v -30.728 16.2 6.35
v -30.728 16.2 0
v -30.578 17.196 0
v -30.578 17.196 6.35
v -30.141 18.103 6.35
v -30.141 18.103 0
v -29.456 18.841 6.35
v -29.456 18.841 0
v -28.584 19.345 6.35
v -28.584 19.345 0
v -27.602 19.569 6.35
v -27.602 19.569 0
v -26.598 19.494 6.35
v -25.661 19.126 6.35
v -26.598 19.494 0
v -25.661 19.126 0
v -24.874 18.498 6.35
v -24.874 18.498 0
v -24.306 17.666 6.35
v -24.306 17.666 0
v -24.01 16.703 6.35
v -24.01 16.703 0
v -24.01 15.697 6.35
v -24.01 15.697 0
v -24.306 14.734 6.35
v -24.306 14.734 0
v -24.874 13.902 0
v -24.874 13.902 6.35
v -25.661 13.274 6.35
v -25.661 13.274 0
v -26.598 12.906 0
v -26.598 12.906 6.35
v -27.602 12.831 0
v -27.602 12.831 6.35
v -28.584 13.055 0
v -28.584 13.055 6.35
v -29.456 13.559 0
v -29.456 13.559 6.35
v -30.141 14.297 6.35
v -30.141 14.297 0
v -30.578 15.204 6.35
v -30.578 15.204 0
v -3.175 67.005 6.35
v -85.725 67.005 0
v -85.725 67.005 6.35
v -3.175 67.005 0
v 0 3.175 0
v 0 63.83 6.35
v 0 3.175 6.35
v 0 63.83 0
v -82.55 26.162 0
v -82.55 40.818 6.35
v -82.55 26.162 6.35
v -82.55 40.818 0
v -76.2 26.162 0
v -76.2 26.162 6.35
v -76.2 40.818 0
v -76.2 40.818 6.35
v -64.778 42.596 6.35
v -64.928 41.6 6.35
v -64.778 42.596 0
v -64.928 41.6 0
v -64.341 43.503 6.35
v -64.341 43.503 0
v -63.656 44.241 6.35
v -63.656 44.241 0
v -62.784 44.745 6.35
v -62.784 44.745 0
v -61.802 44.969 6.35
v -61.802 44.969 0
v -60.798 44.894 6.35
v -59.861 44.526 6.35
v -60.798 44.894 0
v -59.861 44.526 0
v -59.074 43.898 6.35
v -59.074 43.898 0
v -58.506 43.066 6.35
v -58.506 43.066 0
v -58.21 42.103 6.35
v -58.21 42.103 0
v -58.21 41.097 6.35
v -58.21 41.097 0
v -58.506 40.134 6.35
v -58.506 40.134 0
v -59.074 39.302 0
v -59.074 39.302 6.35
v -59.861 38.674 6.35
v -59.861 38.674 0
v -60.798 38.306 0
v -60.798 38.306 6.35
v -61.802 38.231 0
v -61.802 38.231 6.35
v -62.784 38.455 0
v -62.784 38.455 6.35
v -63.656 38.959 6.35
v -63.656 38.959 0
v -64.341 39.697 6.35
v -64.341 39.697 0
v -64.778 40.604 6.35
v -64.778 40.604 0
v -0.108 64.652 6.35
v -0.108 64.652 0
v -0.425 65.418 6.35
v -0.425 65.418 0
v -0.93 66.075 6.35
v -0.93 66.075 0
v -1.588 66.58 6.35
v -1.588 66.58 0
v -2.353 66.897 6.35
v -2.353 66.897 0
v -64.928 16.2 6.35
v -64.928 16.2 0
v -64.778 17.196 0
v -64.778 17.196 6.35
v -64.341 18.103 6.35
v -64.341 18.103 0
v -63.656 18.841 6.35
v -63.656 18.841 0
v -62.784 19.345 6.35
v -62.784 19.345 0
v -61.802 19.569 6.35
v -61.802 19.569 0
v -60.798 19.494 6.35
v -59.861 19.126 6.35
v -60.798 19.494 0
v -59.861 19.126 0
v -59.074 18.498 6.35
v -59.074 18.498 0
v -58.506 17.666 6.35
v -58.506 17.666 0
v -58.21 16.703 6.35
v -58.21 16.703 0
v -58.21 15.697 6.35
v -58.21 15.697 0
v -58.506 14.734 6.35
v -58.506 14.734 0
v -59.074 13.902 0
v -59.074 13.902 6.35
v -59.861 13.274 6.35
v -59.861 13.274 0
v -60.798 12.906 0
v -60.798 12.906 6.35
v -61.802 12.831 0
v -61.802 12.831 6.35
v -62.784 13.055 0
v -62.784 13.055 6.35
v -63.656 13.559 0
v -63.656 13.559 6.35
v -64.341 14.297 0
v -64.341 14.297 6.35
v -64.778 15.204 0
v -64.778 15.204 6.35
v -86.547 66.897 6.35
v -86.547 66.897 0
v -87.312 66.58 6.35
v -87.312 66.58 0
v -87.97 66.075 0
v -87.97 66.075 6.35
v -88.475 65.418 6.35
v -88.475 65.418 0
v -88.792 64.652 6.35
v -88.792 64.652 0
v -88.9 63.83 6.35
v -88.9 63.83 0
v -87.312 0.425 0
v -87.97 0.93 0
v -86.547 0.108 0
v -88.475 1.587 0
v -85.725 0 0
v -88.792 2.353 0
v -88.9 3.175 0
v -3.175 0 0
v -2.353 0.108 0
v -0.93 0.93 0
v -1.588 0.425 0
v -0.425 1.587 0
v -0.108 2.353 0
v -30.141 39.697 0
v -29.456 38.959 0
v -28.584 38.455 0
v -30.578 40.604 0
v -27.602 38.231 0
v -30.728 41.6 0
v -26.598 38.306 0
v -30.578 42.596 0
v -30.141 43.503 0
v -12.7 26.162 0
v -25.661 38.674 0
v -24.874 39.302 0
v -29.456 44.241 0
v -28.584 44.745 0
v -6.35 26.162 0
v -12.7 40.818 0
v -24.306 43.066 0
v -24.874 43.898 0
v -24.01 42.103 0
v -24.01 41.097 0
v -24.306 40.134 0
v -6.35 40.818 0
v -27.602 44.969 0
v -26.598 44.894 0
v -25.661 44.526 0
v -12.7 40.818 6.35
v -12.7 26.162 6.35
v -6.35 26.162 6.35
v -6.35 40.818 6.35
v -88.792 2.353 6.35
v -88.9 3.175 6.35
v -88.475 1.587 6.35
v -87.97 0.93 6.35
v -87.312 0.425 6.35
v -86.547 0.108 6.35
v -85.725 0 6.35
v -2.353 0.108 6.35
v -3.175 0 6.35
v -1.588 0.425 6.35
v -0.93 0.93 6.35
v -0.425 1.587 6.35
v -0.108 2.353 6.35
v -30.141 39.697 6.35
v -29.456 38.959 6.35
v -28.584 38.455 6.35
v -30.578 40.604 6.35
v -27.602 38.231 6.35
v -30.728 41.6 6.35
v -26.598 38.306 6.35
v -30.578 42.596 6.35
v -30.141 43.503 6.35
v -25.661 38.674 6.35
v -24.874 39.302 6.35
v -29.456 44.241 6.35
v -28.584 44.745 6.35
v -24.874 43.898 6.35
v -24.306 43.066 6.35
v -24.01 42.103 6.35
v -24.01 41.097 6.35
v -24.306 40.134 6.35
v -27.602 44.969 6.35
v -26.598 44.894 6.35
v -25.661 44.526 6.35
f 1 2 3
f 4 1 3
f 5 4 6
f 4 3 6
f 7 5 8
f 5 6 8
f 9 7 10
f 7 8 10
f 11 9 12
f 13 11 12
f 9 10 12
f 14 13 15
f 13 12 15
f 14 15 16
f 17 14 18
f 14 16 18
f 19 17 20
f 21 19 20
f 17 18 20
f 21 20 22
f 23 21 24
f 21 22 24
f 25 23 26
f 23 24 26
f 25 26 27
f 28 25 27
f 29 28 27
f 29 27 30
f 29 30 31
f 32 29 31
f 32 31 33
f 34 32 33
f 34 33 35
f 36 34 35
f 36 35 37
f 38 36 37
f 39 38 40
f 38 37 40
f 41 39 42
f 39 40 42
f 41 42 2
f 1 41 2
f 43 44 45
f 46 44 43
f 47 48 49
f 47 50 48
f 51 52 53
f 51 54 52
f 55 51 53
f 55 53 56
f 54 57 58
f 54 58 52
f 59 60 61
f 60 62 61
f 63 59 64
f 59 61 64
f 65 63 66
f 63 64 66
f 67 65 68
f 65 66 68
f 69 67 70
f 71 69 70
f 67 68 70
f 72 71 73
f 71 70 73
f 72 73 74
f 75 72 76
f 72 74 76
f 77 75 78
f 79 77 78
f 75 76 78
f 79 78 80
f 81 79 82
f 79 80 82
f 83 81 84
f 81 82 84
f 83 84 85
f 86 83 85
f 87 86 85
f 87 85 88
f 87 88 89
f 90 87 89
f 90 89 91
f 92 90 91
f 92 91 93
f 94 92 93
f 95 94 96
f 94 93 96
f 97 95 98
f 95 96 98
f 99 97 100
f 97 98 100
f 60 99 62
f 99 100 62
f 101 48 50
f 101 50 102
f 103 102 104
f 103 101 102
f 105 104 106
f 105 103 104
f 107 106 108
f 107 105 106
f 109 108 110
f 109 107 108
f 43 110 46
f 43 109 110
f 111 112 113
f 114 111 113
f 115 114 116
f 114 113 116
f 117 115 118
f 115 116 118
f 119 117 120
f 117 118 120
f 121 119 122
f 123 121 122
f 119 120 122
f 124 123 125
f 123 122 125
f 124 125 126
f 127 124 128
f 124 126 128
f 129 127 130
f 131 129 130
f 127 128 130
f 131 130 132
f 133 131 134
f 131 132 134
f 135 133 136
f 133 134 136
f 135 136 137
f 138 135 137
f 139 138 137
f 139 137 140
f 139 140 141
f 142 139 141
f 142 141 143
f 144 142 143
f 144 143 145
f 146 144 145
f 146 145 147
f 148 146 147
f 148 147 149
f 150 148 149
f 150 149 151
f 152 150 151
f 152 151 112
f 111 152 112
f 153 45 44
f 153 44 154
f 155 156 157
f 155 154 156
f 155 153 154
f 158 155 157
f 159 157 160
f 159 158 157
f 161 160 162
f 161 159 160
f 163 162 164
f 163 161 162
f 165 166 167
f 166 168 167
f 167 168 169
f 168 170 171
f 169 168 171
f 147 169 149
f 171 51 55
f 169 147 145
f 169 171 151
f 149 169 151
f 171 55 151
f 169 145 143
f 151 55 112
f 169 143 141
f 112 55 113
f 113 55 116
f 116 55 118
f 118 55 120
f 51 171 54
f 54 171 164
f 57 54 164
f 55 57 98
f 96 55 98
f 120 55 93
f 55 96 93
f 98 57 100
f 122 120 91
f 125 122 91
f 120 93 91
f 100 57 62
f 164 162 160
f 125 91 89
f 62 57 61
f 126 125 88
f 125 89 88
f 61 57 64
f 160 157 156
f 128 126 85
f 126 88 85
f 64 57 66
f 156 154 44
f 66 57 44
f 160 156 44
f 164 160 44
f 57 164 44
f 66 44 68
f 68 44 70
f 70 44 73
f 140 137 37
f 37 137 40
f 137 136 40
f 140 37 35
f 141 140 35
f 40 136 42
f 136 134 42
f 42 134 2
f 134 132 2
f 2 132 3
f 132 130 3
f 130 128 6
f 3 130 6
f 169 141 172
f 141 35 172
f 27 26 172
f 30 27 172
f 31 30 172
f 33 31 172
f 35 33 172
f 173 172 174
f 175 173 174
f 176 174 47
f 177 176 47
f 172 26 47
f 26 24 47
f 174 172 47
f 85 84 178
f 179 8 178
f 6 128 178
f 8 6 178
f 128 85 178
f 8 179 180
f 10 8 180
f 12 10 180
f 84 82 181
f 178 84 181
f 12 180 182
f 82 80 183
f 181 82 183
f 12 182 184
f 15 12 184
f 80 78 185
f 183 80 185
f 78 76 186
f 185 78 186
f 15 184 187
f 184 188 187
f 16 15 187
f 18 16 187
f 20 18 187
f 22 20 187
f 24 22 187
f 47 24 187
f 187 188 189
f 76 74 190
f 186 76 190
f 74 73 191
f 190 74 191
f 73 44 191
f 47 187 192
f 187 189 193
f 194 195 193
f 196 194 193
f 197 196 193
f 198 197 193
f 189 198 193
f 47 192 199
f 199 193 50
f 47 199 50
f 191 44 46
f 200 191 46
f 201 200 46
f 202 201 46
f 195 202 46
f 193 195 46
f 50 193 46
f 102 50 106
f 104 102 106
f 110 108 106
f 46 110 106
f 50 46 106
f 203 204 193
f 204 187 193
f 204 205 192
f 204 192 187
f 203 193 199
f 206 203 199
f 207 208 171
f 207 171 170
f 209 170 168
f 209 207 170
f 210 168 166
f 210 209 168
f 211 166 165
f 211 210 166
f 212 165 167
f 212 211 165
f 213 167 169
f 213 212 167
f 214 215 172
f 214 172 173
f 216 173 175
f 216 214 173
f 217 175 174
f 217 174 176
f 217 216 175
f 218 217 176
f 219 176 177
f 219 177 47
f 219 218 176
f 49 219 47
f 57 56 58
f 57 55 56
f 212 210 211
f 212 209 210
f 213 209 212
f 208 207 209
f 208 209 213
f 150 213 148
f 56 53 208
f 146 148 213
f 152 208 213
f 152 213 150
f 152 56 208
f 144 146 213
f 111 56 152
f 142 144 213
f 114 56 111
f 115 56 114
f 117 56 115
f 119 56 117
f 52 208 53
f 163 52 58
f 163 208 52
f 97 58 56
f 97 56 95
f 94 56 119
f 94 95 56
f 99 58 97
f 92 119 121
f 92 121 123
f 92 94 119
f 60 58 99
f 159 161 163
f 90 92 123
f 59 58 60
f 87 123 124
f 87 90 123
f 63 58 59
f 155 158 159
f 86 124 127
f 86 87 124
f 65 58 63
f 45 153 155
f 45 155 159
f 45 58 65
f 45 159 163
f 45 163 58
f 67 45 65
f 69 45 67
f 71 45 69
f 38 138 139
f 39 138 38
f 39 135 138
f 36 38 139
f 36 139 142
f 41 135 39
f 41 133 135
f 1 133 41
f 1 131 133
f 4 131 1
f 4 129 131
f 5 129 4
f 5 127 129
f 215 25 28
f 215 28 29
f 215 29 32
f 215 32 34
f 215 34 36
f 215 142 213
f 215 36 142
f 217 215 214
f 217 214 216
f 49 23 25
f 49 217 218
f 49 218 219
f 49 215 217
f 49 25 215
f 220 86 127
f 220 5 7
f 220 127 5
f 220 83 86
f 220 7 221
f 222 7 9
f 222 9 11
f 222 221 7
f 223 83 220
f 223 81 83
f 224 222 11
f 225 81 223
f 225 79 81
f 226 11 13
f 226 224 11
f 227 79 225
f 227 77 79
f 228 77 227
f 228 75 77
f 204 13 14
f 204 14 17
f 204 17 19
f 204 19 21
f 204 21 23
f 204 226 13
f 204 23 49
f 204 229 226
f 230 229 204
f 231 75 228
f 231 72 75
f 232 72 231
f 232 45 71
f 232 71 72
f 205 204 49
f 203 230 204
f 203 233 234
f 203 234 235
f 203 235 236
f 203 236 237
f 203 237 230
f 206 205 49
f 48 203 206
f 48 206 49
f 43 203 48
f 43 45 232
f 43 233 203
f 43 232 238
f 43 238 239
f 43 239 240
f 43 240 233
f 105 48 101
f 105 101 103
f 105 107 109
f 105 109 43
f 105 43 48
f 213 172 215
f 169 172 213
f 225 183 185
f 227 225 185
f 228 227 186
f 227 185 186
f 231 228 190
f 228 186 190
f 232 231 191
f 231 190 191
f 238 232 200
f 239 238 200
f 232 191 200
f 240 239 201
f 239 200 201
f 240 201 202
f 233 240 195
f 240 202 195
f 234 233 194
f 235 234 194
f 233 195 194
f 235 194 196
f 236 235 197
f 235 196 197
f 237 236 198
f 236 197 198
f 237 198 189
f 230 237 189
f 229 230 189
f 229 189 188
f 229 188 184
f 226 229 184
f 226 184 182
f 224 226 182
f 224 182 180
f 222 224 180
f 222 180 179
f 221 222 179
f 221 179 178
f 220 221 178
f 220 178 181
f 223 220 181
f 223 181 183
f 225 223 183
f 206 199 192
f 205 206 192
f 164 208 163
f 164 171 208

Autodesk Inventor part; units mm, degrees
ref_plane "YZ Plane" through (0, 0, 0) normal (1, 0, 0) x (0, 1, 0)
ref_plane "XZ Plane" through (0, 0, 0) normal (0, 1, 0) x (-1, 0, 0)
ref_plane "XY Plane" through (0, 0, 0) normal (0, 0, 1) x (1, 0, 0)
sketch "Sketch1" plane through (0, 0, 0) normal (0, 0, 1) x (1, 0, 0)
  line L0 (0, 0) -> (-88.9, 0)
  line L1 (-88.9, 0) -> (-88.9, 67.0052)
  line L2 (-88.9, 67.0052) -> (0, 67.0052)
  line L3 (0, 67.0052) -> (0, 0)
  dimension "d0" = 88.9
  dimension "d1" = 67.0052
  dimension "d2" = 90
extrude "Extrusion1" add sketch "Sketch1" along normal blind 6.35
sketch "Sketch2" plane through (-88.9, 67.0052, 0) normal (0, 1, 0) x (1, 0, 0)
  line L0 (0, 0) -> (88.9, 0) projected
  line L1 (0, 0) -> (0, -6.35) projected
  line L2 (88.9, -6.35) -> (0, -6.35) projected
  line L3 (88.9, 0) -> (88.9, -6.35) projected
sketch "Sketch3" plane through (0, 0, 0) normal (0, 0, -1) x (-1, 0, 0)
  line L0 (88.9, 0) -> (88.9, 67.0052) projected
  line L1 (0, 67.0052) -> (0, 0) projected
  line L2 (0, 67.0052) -> (0, 40.8178)
  line L3 (0, 40.8178) -> (6.35, 40.8178)
  line L4 (6.35, 40.8178) -> (6.35, 26.162)
  line L5 (6.35, 26.162) -> (12.7, 26.162)
  line L6 (12.7, 26.162) -> (12.7, 40.8178)
  line L7 (12.7, 40.8178) -> (6.35, 40.8178)
  line L8 (88.9, 40.8178) -> (82.55, 40.8178)
  line L9 (82.55, 40.8178) -> (82.55, 26.162)
  line L10 (82.55, 26.162) -> (76.2, 26.162)
  line L11 (76.2, 26.162) -> (76.2, 40.8178)
  line L12 (76.2, 40.8178) -> (82.55, 40.8178)
  dimension "d5" = 26.1874
  dimension "d6" = 6.35
  dimension "d7" = 14.6558
  dimension "d8" = 6.35
  dimension "d9" = 6.35
  dimension "d10" = 6.35
  dimension "d11" = 14.6558
extrude "Extrusion2" cut sketch "Sketch3" against normal blind 25.4
fillet "Fillet1" radius 3.175 4 edges at (0, 67.0052, 3.175) (0, 0, 3.175) (-88.9, 0, 3.175) (-88.9, 67.0052, 3.175)
sketch "Sketch4" plane through (0, 0, 0) normal (0, 0, -1) x (-1, 0, 0)
  circle A0 centre (61.55, 41.6) radius 3.3782 projected
  circle A1 centre (61.55, 16.2) radius 3.3782 projected
  circle A2 centre (27.35, 41.6) radius 3.3782 projected
  circle A3 centre (27.35, 16.2) radius 3.3782 projected
  point P0 (0, 0)
extrude "Extrusion3" cut sketch "Sketch4" against normal blind 25.4
properties part number "hook faceplate" material "Steel"
